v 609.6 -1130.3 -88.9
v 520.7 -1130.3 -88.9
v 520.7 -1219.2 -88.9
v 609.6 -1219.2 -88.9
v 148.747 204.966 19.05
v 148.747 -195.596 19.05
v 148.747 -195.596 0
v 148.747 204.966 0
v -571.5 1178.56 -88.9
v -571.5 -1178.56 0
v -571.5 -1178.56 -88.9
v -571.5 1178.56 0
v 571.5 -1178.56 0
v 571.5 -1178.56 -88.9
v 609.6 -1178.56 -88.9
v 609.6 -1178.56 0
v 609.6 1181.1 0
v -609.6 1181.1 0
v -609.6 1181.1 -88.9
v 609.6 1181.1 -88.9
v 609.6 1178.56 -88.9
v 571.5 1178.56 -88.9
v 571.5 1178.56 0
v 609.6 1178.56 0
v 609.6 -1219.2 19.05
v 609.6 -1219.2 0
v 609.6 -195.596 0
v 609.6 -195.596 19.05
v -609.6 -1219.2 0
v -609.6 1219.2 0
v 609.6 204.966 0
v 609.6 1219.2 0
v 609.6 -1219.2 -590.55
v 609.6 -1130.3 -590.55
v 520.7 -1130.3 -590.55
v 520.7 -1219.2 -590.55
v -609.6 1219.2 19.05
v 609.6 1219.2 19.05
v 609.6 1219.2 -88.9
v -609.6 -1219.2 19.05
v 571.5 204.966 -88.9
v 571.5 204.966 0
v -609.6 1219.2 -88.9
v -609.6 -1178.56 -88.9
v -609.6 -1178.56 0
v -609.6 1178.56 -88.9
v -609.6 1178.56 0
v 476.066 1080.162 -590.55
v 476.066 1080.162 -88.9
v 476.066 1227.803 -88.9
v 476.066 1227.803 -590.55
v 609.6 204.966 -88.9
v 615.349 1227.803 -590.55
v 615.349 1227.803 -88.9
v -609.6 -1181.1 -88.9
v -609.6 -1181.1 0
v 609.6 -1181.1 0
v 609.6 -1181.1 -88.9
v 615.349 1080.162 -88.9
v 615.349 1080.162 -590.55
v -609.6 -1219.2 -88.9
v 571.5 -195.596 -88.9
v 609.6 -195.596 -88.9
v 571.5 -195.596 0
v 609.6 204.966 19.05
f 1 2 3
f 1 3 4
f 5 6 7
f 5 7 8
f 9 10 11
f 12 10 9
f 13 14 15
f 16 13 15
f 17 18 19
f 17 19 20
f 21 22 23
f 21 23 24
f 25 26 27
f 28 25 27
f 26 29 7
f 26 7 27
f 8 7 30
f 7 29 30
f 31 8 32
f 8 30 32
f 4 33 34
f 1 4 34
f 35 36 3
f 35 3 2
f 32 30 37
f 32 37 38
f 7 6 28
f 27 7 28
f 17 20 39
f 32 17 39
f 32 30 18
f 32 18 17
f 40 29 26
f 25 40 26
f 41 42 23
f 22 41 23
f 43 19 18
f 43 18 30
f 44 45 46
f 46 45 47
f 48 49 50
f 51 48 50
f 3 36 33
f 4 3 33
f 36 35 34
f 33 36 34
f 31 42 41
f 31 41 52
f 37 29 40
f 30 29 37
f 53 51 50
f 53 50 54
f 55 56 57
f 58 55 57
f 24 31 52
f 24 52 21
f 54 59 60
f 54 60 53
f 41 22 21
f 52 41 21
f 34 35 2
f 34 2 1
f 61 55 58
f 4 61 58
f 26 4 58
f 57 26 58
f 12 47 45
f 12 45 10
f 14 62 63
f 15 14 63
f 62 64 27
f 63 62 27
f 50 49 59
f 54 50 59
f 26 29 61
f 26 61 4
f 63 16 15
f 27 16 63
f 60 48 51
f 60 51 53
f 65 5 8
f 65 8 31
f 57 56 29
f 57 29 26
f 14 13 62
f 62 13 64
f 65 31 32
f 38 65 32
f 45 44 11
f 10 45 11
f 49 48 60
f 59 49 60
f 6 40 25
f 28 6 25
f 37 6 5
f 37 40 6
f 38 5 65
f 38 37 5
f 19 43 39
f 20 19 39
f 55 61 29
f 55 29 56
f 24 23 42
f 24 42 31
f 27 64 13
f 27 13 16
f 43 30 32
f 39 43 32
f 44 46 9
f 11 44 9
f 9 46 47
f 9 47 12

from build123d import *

# Parameters (mm, degrees)
F1_W      = 1219.2
F1_H      = 2438.4
F2_DEPTH  = 19.05
F3_W      = 1219.2
F3_H      = 38.1
F4_DEPTH  = 88.9
F5_W      = 38.1
F5_H      = 2357.12
F6_DEPTH  = 88.9
F7_W      = 460.8534946203
F7_H      = 400.5613774061
F8_DEPTH  = 107.951
F10_W     = 88.9
F10_H     = 88.9
F11_DEPTH = 501.65
F10_W_2   = 139.2837166786
F10_H_2   = 147.6407051086


with BuildPart() as f2:
    # F1 (on Top) → F2 (new body)
    with BuildSketch(Plane.XY):
        Rectangle(F1_W, F1_H)
    extrude(amount=F2_DEPTH)


with BuildPart() as f4:
    # F3 (on Top) → F4 (new body)
    with BuildSketch(Plane.XY):
        with Locations((0, 1200.15)):
            Rectangle(F3_W, F3_H)
    extrude(amount=-F4_DEPTH)


with BuildPart() as f4b:
    # F3 (on Top) → F4, piece 2 (new body)
    with BuildSketch(Plane.XY):
        with Locations((0, -1200.15)):
            Rectangle(F3_W, F3_H)
    extrude(amount=-F4_DEPTH)


with BuildPart() as f6:
    # F5 (on Top) → F6 (new body)
    with BuildSketch(Plane.XY):
        with Locations((-590.55, 0)):
            Rectangle(F5_W, F5_H)
    extrude(amount=-F6_DEPTH)


with BuildPart() as f6b:
    # F5 (on Top) → F6, piece 2 (new body)
    with BuildSketch(Plane.XY):
        with Locations((590.55, 0)):
            Rectangle(F5_W, F5_H)
    extrude(amount=-F6_DEPTH)


with BuildPart() as f8_tool:
    # F7 (on face) → F8 (new body, through all)
    with BuildSketch(Plane.XY.offset(19.05)):
        with Locations((379.1732526898, 4.6849474311)):
            Rectangle(F7_W, F7_H)
    extrude(amount=-F8_DEPTH)


with BuildPart() as f2_1:
    add(f2.part)

    # F8: cut by f8_tool
    add(f8_tool.part, mode=Mode.SUBTRACT)


with BuildPart() as f6b_1:
    add(f6b.part)

    # F8: cut by f8_tool
    add(f8_tool.part, mode=Mode.SUBTRACT)


with BuildPart() as f11:
    # F10 (on offset) → F11 (new body, through all)
    with BuildSketch(Plane.XY.offset(-590.55)):
        with Locations((565.15, -1174.75)):
            Rectangle(F10_W, F10_H)
    extrude(amount=F11_DEPTH)


with BuildPart() as f11b:
    # F10 (on offset) → F11, piece 2 (new body, through all)
    with BuildSketch(Plane.XY.offset(-590.55)):
        with Locations((545.7075536251, 1153.9824008942)):
            Rectangle(F10_W_2, F10_H_2)
    extrude(amount=F11_DEPTH)


solid = Compound([f4.part, f4b.part, f6.part, f2_1.part, f6b_1.part, f11.part, f11b.part])
